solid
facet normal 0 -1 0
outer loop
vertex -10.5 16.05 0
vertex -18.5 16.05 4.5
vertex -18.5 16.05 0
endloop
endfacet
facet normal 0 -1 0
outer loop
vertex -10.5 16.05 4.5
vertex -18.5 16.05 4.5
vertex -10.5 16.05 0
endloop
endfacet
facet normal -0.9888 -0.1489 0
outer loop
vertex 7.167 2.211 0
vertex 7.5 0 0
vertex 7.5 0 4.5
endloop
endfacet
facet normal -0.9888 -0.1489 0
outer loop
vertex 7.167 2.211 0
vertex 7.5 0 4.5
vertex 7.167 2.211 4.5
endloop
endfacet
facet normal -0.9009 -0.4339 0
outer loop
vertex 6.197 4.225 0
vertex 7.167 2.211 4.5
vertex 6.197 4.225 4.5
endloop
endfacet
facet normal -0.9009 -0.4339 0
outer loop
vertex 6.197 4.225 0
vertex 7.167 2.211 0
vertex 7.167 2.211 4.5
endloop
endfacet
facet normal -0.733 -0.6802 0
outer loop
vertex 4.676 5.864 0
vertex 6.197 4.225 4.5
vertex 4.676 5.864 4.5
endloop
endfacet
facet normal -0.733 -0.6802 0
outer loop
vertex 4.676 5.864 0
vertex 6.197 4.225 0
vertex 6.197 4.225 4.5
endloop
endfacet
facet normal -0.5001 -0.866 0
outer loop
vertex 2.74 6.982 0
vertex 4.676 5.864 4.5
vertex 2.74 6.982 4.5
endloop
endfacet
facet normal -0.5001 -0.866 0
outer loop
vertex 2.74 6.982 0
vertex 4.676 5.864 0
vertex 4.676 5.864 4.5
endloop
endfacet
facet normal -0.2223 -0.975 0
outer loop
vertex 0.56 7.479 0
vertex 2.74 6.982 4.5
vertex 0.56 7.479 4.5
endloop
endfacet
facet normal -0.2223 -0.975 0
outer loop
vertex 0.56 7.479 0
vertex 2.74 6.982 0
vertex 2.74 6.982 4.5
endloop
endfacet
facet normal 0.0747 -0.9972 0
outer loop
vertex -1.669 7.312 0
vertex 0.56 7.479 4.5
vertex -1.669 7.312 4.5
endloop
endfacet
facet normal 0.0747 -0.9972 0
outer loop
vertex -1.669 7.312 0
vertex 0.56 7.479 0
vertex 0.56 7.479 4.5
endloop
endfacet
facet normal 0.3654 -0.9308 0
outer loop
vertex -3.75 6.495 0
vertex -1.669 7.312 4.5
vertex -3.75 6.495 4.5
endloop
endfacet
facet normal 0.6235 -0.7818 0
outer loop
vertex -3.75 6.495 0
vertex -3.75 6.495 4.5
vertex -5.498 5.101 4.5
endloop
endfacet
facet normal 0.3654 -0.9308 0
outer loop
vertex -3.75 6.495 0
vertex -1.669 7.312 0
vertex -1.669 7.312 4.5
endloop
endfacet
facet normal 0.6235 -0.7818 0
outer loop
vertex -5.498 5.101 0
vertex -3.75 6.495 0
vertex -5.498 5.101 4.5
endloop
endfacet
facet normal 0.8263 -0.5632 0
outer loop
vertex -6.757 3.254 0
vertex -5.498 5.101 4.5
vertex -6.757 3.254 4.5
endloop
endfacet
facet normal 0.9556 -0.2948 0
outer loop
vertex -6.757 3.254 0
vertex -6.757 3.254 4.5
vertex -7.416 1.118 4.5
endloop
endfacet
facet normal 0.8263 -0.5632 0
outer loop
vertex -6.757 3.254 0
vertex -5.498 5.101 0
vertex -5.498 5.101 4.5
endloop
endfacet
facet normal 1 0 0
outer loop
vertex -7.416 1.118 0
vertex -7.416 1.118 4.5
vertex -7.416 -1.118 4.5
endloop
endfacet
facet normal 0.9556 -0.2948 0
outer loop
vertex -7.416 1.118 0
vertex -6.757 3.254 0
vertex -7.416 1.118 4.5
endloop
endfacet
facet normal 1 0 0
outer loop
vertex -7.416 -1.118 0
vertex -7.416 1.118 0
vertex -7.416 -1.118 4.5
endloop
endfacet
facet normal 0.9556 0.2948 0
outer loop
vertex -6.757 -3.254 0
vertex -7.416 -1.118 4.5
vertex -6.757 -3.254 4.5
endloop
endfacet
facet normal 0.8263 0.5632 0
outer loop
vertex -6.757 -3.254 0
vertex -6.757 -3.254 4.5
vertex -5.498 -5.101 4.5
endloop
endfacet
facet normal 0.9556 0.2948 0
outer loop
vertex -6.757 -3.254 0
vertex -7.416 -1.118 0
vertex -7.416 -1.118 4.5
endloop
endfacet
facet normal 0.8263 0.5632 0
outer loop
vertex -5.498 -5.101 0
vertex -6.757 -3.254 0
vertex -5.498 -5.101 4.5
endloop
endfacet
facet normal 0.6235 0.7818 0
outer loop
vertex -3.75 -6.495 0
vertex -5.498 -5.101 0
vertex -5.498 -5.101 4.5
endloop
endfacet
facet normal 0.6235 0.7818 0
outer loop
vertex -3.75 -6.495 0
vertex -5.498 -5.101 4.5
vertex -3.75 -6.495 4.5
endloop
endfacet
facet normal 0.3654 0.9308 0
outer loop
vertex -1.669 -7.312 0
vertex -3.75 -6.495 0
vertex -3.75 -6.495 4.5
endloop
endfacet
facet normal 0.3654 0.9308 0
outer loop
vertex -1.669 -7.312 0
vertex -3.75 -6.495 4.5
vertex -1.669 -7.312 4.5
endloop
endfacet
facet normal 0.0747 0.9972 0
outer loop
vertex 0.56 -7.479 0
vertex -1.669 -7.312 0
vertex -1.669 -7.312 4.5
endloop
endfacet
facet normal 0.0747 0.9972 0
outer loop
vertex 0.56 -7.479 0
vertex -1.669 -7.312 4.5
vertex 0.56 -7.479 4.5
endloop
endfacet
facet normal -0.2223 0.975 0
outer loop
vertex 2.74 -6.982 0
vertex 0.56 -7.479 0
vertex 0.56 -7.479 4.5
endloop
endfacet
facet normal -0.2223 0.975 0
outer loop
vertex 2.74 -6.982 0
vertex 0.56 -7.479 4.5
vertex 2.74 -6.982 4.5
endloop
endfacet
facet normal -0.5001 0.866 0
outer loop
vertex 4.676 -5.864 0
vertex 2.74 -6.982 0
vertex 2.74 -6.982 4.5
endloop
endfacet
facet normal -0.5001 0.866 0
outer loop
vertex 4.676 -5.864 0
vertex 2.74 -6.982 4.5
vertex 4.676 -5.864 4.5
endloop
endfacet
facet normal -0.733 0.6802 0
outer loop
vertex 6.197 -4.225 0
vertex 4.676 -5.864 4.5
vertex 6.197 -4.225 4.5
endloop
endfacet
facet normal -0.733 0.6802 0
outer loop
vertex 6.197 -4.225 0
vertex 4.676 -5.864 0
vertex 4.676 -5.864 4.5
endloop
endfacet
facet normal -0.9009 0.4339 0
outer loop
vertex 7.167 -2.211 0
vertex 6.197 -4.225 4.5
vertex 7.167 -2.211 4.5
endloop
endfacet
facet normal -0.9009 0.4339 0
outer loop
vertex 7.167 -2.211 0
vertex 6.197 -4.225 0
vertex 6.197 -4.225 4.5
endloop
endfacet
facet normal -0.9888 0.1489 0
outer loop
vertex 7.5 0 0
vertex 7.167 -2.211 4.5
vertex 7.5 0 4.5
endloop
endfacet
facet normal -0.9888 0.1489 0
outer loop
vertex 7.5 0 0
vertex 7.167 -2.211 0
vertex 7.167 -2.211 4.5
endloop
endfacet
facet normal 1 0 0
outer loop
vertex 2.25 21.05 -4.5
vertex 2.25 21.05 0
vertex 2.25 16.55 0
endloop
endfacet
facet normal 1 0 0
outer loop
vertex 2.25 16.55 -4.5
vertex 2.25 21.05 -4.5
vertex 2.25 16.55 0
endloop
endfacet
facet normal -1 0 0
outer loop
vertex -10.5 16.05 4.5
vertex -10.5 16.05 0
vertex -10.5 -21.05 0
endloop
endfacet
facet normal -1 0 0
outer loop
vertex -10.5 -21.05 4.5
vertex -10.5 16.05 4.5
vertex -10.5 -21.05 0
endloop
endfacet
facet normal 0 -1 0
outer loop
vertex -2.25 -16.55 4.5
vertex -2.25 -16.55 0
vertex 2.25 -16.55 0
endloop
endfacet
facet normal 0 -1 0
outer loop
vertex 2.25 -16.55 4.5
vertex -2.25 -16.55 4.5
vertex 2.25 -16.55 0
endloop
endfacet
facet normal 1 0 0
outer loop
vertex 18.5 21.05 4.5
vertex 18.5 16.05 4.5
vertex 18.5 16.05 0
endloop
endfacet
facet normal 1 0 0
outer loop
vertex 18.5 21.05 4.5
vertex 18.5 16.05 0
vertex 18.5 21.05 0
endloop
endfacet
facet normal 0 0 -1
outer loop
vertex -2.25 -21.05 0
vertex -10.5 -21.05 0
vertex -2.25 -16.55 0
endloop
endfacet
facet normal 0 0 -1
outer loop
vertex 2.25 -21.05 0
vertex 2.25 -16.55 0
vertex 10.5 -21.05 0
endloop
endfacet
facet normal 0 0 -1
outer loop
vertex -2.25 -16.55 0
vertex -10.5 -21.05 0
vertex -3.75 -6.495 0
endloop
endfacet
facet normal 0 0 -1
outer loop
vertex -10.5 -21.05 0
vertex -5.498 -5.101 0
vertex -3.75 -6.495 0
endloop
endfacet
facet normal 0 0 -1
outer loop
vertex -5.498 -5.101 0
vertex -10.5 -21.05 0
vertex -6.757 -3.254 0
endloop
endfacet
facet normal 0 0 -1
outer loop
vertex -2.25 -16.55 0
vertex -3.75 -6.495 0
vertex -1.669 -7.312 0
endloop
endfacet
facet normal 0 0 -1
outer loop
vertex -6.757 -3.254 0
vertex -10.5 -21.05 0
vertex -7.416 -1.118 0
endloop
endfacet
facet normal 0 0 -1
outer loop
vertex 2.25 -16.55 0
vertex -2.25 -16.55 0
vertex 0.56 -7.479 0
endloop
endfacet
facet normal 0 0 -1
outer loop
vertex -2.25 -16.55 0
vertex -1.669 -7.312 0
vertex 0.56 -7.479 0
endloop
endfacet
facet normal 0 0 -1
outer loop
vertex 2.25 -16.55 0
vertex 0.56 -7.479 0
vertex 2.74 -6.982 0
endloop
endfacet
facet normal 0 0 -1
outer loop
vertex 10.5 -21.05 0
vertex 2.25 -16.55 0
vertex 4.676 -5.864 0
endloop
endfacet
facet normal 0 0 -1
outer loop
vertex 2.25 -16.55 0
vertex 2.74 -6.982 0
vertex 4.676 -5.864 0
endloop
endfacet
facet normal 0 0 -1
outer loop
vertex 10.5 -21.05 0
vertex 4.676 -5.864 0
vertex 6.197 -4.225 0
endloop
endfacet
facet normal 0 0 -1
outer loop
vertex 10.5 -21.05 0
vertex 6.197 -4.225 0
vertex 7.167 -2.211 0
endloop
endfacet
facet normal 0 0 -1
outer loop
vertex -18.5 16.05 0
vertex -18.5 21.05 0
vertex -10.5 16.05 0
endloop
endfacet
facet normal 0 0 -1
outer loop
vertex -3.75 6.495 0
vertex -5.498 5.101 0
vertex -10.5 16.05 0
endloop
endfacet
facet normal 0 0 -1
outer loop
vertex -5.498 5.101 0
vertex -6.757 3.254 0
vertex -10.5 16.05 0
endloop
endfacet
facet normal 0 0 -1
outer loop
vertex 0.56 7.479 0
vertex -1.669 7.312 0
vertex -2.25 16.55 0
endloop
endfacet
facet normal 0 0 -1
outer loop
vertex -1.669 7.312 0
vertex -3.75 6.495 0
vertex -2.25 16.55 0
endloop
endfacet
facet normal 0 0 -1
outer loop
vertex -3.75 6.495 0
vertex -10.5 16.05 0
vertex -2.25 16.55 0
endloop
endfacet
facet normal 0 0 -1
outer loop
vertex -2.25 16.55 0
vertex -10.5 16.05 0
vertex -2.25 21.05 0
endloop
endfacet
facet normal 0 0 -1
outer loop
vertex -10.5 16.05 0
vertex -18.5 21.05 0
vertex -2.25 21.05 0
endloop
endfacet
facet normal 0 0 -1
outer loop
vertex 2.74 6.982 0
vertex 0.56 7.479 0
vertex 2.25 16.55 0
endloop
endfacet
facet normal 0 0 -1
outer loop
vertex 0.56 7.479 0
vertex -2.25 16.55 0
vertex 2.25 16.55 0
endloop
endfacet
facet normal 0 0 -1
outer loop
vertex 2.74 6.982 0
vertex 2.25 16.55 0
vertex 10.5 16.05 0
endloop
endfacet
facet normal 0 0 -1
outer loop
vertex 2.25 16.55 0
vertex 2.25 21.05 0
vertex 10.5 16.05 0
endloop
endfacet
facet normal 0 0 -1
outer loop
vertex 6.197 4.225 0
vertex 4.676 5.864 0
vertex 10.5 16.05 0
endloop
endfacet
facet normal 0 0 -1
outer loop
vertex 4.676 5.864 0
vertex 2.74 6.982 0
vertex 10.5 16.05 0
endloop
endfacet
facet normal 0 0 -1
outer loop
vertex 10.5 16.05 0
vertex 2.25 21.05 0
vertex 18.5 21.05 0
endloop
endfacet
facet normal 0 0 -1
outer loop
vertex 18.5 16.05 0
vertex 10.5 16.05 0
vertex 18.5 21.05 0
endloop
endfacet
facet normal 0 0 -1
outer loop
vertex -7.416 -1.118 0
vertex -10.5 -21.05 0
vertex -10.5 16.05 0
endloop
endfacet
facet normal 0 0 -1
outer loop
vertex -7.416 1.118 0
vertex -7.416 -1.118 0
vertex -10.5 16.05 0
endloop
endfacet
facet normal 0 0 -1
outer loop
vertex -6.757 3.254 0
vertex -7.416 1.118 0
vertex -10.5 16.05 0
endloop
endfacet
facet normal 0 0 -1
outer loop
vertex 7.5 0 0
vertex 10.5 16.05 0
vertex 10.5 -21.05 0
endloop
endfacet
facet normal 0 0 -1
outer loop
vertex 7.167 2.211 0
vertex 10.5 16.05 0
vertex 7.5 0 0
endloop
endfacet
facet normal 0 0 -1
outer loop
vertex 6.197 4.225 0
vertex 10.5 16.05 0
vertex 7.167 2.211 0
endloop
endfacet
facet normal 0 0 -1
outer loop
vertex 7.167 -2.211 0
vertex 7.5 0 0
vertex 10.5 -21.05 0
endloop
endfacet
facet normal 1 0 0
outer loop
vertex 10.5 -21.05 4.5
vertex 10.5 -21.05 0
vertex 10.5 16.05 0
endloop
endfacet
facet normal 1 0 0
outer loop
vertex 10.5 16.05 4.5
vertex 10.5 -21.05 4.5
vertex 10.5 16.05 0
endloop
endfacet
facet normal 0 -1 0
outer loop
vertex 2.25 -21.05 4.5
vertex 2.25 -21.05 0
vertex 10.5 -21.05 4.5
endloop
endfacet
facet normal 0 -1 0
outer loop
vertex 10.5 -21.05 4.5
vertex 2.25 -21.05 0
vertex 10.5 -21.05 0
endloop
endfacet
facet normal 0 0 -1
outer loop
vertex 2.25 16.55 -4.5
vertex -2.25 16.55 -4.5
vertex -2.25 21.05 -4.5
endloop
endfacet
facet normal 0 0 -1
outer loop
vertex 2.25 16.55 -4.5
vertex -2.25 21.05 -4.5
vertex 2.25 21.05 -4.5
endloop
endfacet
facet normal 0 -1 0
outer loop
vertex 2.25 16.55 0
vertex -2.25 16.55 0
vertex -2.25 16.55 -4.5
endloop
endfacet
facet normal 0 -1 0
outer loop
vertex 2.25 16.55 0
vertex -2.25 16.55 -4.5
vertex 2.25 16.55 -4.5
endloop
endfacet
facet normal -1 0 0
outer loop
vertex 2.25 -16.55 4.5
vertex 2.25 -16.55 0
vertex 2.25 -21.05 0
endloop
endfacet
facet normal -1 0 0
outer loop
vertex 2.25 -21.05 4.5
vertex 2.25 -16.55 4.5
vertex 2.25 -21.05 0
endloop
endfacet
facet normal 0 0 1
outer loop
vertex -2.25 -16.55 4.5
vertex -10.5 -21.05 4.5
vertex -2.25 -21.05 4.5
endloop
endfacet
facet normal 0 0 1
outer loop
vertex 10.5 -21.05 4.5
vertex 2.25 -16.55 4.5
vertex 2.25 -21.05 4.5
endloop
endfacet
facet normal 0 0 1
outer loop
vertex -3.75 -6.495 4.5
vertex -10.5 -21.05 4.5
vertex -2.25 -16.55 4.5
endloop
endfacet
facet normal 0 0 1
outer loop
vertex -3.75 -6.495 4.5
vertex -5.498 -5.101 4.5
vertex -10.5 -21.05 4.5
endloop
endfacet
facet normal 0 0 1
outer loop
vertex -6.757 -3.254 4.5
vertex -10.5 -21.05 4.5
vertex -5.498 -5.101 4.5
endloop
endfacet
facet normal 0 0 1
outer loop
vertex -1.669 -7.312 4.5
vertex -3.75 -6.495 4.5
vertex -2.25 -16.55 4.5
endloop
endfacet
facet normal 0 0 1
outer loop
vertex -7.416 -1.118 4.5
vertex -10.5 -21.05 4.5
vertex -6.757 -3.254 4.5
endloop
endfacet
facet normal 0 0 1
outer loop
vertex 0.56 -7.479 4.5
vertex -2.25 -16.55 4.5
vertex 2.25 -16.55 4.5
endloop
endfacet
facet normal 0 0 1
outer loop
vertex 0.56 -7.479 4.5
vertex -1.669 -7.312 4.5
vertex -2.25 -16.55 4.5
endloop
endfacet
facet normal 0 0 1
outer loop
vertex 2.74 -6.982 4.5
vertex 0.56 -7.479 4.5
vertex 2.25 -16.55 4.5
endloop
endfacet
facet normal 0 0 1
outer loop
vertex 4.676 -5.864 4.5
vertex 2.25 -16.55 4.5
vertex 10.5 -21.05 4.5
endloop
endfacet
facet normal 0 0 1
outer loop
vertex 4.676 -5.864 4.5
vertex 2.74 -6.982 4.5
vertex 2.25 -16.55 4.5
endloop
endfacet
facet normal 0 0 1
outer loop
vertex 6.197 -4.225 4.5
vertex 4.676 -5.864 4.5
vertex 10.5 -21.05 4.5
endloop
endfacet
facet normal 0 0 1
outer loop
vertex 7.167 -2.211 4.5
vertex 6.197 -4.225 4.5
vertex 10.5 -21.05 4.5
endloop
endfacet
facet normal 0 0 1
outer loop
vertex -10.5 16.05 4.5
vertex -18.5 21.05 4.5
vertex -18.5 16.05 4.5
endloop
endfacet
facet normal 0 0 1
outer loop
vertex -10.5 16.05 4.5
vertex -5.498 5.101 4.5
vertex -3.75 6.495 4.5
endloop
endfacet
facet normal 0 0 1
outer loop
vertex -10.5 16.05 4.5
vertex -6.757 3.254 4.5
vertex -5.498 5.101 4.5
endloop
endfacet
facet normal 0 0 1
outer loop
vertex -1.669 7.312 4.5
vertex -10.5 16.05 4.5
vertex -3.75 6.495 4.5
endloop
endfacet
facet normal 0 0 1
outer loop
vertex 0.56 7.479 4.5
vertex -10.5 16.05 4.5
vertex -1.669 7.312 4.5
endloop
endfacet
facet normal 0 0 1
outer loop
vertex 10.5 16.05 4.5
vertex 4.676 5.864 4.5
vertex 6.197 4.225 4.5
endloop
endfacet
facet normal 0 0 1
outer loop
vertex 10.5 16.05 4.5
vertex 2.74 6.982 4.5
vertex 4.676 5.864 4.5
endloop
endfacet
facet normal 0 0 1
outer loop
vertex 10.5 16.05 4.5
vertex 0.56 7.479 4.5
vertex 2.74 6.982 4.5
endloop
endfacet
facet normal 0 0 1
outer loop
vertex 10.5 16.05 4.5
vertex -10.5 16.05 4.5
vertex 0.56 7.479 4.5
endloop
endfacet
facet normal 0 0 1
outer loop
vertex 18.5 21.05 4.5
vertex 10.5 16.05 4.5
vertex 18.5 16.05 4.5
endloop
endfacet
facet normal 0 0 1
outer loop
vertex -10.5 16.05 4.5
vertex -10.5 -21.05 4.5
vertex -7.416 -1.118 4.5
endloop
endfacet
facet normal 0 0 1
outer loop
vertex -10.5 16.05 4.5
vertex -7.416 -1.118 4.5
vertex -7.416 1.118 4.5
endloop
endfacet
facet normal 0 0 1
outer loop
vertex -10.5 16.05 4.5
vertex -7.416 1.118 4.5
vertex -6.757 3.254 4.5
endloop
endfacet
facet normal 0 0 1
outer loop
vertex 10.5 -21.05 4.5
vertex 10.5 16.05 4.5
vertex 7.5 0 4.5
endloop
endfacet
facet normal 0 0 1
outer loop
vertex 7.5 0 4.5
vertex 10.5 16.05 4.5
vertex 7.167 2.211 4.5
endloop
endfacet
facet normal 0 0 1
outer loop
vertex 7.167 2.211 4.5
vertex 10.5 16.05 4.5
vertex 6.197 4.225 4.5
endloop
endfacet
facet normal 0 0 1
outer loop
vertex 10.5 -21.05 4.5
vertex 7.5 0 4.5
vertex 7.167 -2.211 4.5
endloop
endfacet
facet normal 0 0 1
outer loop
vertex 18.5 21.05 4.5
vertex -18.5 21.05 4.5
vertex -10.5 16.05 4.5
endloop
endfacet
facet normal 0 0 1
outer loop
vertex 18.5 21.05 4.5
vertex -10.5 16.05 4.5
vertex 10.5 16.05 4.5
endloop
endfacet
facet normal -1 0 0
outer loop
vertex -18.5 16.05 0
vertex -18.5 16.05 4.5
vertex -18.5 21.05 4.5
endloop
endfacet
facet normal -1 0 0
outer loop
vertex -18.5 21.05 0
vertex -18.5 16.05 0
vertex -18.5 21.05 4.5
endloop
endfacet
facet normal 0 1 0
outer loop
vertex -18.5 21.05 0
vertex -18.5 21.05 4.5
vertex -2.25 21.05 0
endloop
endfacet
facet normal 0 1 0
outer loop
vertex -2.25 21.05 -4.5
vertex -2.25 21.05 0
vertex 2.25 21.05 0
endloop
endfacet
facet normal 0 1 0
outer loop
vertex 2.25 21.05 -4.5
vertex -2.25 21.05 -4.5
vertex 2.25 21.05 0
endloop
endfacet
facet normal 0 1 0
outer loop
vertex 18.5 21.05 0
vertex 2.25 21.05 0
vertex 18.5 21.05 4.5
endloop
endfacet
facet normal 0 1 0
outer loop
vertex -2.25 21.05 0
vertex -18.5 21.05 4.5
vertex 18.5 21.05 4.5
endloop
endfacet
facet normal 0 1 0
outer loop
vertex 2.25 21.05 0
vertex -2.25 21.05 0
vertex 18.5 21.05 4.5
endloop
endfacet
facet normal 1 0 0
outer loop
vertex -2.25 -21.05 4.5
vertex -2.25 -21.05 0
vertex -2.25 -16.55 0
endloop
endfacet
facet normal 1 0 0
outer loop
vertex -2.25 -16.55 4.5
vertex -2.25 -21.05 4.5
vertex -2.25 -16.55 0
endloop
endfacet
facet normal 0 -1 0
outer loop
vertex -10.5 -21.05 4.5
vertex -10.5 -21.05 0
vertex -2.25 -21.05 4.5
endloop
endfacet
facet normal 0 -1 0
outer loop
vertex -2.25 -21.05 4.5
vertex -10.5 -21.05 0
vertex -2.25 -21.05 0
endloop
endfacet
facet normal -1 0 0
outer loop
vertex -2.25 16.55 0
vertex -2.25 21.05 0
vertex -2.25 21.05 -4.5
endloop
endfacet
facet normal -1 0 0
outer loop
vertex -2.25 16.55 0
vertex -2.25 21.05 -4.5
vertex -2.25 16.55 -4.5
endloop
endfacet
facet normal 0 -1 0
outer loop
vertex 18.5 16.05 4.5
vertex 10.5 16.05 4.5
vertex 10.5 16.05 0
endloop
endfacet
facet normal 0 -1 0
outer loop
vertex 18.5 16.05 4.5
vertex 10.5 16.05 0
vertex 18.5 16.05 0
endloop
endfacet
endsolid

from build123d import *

# Parameters (mm, degrees)
F0_R     = 7.5
F1_DEPTH = 4.5
F2_W     = 4.5
F2_H     = 4.5
F3_DEPTH = 4.5
F4_W     = 37
F4_H     = 5
F5_DEPTH = 4.5


with BuildPart() as f1:
    # F0 (on Top) → F1 (new body)
    with BuildSketch(Plane.XY):
        Polygon((10.5, 21.05), (-10.5, 21.05), (-10.5, -21.05), (-2.25, -21.05), (-2.25, -16.55), (2.25, -16.55), (2.25, -21.05), (10.5, -21.05), align=None)
        Circle(F0_R, mode=Mode.SUBTRACT)
    extrude(amount=F1_DEPTH)

    # F2 (on face) → F3 (join)
    with BuildSketch(Plane(origin=(0, 0, 0), x_dir=(1, 0, 0), z_dir=(0, 0, -1))):
        with Locations((0, -18.8)):
            Rectangle(F2_W, F2_H)
    extrude(amount=F3_DEPTH)

    # F4 (on face) → F5 (join)
    with BuildSketch(Plane.XY.offset(4.5)):
        with Locations((0, 18.55)):
            Rectangle(F4_W, F4_H)
    extrude(amount=-F5_DEPTH)


solid = f1.part
